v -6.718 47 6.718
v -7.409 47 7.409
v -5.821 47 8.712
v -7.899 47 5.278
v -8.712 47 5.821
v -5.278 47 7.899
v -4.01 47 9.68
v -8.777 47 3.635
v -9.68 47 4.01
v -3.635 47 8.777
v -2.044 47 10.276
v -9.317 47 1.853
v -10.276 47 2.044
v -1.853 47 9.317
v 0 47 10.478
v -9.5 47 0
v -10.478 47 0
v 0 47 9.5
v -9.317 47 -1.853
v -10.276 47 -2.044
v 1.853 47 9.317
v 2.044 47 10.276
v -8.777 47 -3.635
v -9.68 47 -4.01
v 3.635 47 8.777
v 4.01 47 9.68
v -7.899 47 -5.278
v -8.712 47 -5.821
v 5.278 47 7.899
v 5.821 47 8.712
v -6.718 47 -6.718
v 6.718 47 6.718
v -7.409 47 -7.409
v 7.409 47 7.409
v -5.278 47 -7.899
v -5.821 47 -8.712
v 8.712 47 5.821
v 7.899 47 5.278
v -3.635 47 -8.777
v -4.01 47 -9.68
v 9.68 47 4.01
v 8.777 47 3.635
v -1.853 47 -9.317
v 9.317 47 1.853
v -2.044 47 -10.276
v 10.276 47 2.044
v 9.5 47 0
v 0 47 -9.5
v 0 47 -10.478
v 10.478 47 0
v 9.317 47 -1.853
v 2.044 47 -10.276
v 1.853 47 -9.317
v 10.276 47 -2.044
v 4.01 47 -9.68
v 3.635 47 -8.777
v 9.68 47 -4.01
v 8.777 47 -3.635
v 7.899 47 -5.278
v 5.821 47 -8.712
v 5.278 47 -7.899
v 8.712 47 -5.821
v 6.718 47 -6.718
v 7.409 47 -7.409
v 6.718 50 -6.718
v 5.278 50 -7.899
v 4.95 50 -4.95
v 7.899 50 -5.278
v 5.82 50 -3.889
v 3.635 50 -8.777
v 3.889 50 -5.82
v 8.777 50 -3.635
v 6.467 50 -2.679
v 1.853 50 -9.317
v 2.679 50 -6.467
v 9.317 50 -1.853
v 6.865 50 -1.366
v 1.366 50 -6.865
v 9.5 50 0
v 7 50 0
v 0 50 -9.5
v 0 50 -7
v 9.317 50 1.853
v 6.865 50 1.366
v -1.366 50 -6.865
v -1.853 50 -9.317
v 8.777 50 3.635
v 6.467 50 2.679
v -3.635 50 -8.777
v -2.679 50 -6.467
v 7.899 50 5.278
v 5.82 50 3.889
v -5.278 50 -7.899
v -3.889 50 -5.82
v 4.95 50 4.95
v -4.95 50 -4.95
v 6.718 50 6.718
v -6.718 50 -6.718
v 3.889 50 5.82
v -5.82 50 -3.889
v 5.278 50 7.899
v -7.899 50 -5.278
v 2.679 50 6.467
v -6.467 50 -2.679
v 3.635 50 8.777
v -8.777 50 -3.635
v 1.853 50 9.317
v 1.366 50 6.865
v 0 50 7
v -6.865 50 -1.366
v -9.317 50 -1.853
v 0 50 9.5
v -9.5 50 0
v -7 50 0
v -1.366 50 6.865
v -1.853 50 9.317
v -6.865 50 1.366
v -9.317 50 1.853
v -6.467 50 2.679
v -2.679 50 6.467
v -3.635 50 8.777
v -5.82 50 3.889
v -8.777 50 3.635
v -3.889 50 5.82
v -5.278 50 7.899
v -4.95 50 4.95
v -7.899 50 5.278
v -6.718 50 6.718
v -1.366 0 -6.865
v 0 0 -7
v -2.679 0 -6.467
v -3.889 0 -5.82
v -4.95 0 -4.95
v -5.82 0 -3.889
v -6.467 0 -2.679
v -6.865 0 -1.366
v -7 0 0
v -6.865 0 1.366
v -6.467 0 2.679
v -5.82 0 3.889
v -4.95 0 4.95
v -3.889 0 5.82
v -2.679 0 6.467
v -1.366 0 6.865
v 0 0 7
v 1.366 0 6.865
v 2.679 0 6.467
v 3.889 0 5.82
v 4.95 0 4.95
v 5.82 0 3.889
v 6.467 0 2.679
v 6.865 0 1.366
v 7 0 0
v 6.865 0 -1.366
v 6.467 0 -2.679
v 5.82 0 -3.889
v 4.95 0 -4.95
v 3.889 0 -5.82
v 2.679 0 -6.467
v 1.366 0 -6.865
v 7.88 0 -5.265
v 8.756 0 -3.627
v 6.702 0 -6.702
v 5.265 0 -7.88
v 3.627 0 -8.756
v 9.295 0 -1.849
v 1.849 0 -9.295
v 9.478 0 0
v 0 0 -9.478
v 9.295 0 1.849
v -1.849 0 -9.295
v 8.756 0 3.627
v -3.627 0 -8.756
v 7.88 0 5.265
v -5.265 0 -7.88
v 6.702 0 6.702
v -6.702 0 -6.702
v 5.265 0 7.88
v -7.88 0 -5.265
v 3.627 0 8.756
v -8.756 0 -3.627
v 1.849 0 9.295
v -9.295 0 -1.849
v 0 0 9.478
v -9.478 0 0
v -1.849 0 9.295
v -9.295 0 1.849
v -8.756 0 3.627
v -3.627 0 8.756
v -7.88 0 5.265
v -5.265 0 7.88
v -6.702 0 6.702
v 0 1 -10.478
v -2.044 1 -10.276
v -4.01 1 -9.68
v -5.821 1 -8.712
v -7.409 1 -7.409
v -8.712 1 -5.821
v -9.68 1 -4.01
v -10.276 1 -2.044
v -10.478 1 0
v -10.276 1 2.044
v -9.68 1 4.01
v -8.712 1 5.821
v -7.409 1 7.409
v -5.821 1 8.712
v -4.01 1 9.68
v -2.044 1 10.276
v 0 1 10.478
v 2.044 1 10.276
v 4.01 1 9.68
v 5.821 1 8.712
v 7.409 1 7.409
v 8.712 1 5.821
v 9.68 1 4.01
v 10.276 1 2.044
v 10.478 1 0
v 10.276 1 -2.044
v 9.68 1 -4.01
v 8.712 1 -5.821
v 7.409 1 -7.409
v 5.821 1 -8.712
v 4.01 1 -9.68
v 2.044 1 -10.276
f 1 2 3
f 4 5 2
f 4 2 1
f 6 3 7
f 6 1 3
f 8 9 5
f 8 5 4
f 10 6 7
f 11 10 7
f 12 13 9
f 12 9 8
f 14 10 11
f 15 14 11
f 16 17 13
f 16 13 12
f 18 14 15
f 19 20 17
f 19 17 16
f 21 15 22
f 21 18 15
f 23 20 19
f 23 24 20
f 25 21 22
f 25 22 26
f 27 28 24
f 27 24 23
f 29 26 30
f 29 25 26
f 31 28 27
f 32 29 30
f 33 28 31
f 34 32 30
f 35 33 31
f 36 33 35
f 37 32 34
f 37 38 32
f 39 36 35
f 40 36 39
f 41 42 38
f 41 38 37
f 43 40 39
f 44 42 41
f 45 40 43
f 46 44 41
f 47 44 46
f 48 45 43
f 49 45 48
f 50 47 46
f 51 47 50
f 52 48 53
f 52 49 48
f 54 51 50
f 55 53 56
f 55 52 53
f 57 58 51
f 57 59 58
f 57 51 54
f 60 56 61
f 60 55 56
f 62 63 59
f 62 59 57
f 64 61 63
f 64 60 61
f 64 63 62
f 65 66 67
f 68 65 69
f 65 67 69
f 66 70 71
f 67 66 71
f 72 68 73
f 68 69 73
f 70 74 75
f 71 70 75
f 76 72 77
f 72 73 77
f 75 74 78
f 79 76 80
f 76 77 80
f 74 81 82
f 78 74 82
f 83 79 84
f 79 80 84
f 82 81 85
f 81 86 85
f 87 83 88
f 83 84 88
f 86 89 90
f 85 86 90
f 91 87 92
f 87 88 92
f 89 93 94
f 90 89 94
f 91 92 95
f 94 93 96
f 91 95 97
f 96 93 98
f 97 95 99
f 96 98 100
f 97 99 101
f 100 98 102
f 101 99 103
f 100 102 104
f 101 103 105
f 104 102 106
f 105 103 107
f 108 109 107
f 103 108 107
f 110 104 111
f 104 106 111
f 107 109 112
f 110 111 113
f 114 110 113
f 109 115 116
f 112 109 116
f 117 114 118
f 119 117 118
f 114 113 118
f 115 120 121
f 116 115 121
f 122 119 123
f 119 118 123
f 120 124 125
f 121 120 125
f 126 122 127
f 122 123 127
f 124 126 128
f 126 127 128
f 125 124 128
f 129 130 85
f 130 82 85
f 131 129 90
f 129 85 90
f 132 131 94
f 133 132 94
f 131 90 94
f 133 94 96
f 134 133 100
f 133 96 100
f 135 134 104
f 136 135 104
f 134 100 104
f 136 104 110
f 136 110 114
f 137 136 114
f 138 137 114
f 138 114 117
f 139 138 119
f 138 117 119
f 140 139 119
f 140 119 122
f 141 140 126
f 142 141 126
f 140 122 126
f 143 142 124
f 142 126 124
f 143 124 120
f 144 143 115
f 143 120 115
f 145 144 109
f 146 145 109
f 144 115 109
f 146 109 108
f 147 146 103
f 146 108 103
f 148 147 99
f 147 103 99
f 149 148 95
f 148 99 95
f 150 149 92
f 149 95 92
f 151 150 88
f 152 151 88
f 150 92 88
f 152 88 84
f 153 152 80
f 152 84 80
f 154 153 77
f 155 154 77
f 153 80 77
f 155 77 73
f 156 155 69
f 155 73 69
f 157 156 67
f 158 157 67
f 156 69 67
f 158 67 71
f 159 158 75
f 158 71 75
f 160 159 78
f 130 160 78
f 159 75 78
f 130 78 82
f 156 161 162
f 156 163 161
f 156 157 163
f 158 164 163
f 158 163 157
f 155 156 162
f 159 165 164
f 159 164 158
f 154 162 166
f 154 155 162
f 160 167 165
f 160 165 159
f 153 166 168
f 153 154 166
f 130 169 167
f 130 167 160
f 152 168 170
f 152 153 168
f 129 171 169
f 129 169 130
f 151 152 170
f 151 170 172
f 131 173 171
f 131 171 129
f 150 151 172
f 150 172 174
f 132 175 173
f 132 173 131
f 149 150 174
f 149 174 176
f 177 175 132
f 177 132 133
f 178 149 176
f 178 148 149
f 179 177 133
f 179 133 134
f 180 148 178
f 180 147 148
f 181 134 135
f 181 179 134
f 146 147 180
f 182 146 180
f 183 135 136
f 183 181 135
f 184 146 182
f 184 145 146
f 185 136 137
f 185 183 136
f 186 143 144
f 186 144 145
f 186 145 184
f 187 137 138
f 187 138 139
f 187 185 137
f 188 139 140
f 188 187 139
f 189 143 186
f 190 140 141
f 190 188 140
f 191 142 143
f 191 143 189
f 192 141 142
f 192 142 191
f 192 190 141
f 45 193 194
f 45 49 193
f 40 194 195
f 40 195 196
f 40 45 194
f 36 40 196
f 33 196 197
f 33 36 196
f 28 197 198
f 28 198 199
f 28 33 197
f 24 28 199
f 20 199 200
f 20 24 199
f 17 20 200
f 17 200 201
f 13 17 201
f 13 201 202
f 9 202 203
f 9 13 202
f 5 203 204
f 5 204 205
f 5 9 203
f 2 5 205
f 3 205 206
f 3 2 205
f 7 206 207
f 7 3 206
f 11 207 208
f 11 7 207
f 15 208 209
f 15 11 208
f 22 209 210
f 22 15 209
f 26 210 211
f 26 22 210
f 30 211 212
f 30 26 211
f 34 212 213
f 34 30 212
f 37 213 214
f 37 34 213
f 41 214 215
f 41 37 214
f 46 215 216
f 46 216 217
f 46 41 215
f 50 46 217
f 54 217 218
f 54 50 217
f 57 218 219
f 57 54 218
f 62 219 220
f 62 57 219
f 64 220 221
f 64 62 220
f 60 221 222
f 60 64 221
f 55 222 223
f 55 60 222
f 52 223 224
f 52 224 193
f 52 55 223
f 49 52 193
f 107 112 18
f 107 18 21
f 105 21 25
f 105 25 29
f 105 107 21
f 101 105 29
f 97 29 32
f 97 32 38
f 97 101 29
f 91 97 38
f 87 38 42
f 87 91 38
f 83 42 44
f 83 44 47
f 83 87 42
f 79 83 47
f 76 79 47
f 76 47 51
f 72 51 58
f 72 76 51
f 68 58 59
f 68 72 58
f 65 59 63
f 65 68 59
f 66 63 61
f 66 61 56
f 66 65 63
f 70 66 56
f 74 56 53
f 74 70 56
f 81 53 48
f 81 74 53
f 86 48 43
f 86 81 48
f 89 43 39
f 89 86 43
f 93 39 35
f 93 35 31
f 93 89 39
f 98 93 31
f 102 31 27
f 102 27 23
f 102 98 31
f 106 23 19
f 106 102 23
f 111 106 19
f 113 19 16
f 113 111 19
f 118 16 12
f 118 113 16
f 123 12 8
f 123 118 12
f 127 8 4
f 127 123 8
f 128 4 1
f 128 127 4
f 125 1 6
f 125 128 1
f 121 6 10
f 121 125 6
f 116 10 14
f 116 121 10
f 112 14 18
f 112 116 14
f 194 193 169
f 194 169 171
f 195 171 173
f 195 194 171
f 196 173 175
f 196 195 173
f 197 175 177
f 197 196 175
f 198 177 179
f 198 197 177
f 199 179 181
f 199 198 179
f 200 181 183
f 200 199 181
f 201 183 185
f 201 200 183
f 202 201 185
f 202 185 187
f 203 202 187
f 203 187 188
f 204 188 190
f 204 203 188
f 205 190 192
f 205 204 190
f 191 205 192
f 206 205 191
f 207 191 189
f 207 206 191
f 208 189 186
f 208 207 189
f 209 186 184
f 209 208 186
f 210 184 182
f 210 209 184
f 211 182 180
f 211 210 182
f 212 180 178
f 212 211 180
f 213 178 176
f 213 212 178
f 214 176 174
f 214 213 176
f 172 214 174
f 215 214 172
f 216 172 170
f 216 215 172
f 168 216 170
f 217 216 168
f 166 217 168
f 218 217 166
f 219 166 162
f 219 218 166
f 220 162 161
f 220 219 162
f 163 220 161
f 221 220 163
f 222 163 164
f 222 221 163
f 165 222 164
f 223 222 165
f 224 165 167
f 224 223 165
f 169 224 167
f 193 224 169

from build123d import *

# Parameters (mm, degrees)
SKETCH_1_W          = 3.4775
SKETCH_1_H          = 50
CHAMFER_1_SIZE      = 1
SKETCH_2_OUTSIDE_W  = 34.58
SKETCH_2_OUTSIDE_H  = 34.58
SKETCH_2_OUTSIDE_R  = 9.5
CUT_EXTRUDE_1_DEPTH = 3


with BuildPart() as part:
    # Эскиз1 → Повернуть1 (revolve)
    with BuildSketch(Plane.XY, mode=Mode.PRIVATE) as revolve_1_sk:
        with Locations((8.73875, 25)):
            Rectangle(SKETCH_1_W, SKETCH_1_H)
    revolve(revolve_1_sk.sketch.rotate(Axis((0, 0, 0), (0, 1, 0)), 90), axis=Axis((0, 0, 0), (0, 1, 0)))

    # Фаска1
    chamfer_1_edges = [part.edges().sort_by_distance(p)[0] for p in [
        (0, 0, 10.4775),
    ]]
    chamfer(chamfer_1_edges, length=CHAMFER_1_SIZE)

    # Эскиз2 outside → Вытянуть1 (cut)
    with BuildSketch(Plane(origin=(0, 50, 0), x_dir=(1, 0, 0), z_dir=(0, 1, 0))):
        Rectangle(SKETCH_2_OUTSIDE_W, SKETCH_2_OUTSIDE_H)
        with Locations(Location((0, 0, 0), (0, 0, 270))):
            Circle(SKETCH_2_OUTSIDE_R, mode=Mode.SUBTRACT)
    extrude(amount=-CUT_EXTRUDE_1_DEPTH, mode=Mode.SUBTRACT)


solid = part.part
